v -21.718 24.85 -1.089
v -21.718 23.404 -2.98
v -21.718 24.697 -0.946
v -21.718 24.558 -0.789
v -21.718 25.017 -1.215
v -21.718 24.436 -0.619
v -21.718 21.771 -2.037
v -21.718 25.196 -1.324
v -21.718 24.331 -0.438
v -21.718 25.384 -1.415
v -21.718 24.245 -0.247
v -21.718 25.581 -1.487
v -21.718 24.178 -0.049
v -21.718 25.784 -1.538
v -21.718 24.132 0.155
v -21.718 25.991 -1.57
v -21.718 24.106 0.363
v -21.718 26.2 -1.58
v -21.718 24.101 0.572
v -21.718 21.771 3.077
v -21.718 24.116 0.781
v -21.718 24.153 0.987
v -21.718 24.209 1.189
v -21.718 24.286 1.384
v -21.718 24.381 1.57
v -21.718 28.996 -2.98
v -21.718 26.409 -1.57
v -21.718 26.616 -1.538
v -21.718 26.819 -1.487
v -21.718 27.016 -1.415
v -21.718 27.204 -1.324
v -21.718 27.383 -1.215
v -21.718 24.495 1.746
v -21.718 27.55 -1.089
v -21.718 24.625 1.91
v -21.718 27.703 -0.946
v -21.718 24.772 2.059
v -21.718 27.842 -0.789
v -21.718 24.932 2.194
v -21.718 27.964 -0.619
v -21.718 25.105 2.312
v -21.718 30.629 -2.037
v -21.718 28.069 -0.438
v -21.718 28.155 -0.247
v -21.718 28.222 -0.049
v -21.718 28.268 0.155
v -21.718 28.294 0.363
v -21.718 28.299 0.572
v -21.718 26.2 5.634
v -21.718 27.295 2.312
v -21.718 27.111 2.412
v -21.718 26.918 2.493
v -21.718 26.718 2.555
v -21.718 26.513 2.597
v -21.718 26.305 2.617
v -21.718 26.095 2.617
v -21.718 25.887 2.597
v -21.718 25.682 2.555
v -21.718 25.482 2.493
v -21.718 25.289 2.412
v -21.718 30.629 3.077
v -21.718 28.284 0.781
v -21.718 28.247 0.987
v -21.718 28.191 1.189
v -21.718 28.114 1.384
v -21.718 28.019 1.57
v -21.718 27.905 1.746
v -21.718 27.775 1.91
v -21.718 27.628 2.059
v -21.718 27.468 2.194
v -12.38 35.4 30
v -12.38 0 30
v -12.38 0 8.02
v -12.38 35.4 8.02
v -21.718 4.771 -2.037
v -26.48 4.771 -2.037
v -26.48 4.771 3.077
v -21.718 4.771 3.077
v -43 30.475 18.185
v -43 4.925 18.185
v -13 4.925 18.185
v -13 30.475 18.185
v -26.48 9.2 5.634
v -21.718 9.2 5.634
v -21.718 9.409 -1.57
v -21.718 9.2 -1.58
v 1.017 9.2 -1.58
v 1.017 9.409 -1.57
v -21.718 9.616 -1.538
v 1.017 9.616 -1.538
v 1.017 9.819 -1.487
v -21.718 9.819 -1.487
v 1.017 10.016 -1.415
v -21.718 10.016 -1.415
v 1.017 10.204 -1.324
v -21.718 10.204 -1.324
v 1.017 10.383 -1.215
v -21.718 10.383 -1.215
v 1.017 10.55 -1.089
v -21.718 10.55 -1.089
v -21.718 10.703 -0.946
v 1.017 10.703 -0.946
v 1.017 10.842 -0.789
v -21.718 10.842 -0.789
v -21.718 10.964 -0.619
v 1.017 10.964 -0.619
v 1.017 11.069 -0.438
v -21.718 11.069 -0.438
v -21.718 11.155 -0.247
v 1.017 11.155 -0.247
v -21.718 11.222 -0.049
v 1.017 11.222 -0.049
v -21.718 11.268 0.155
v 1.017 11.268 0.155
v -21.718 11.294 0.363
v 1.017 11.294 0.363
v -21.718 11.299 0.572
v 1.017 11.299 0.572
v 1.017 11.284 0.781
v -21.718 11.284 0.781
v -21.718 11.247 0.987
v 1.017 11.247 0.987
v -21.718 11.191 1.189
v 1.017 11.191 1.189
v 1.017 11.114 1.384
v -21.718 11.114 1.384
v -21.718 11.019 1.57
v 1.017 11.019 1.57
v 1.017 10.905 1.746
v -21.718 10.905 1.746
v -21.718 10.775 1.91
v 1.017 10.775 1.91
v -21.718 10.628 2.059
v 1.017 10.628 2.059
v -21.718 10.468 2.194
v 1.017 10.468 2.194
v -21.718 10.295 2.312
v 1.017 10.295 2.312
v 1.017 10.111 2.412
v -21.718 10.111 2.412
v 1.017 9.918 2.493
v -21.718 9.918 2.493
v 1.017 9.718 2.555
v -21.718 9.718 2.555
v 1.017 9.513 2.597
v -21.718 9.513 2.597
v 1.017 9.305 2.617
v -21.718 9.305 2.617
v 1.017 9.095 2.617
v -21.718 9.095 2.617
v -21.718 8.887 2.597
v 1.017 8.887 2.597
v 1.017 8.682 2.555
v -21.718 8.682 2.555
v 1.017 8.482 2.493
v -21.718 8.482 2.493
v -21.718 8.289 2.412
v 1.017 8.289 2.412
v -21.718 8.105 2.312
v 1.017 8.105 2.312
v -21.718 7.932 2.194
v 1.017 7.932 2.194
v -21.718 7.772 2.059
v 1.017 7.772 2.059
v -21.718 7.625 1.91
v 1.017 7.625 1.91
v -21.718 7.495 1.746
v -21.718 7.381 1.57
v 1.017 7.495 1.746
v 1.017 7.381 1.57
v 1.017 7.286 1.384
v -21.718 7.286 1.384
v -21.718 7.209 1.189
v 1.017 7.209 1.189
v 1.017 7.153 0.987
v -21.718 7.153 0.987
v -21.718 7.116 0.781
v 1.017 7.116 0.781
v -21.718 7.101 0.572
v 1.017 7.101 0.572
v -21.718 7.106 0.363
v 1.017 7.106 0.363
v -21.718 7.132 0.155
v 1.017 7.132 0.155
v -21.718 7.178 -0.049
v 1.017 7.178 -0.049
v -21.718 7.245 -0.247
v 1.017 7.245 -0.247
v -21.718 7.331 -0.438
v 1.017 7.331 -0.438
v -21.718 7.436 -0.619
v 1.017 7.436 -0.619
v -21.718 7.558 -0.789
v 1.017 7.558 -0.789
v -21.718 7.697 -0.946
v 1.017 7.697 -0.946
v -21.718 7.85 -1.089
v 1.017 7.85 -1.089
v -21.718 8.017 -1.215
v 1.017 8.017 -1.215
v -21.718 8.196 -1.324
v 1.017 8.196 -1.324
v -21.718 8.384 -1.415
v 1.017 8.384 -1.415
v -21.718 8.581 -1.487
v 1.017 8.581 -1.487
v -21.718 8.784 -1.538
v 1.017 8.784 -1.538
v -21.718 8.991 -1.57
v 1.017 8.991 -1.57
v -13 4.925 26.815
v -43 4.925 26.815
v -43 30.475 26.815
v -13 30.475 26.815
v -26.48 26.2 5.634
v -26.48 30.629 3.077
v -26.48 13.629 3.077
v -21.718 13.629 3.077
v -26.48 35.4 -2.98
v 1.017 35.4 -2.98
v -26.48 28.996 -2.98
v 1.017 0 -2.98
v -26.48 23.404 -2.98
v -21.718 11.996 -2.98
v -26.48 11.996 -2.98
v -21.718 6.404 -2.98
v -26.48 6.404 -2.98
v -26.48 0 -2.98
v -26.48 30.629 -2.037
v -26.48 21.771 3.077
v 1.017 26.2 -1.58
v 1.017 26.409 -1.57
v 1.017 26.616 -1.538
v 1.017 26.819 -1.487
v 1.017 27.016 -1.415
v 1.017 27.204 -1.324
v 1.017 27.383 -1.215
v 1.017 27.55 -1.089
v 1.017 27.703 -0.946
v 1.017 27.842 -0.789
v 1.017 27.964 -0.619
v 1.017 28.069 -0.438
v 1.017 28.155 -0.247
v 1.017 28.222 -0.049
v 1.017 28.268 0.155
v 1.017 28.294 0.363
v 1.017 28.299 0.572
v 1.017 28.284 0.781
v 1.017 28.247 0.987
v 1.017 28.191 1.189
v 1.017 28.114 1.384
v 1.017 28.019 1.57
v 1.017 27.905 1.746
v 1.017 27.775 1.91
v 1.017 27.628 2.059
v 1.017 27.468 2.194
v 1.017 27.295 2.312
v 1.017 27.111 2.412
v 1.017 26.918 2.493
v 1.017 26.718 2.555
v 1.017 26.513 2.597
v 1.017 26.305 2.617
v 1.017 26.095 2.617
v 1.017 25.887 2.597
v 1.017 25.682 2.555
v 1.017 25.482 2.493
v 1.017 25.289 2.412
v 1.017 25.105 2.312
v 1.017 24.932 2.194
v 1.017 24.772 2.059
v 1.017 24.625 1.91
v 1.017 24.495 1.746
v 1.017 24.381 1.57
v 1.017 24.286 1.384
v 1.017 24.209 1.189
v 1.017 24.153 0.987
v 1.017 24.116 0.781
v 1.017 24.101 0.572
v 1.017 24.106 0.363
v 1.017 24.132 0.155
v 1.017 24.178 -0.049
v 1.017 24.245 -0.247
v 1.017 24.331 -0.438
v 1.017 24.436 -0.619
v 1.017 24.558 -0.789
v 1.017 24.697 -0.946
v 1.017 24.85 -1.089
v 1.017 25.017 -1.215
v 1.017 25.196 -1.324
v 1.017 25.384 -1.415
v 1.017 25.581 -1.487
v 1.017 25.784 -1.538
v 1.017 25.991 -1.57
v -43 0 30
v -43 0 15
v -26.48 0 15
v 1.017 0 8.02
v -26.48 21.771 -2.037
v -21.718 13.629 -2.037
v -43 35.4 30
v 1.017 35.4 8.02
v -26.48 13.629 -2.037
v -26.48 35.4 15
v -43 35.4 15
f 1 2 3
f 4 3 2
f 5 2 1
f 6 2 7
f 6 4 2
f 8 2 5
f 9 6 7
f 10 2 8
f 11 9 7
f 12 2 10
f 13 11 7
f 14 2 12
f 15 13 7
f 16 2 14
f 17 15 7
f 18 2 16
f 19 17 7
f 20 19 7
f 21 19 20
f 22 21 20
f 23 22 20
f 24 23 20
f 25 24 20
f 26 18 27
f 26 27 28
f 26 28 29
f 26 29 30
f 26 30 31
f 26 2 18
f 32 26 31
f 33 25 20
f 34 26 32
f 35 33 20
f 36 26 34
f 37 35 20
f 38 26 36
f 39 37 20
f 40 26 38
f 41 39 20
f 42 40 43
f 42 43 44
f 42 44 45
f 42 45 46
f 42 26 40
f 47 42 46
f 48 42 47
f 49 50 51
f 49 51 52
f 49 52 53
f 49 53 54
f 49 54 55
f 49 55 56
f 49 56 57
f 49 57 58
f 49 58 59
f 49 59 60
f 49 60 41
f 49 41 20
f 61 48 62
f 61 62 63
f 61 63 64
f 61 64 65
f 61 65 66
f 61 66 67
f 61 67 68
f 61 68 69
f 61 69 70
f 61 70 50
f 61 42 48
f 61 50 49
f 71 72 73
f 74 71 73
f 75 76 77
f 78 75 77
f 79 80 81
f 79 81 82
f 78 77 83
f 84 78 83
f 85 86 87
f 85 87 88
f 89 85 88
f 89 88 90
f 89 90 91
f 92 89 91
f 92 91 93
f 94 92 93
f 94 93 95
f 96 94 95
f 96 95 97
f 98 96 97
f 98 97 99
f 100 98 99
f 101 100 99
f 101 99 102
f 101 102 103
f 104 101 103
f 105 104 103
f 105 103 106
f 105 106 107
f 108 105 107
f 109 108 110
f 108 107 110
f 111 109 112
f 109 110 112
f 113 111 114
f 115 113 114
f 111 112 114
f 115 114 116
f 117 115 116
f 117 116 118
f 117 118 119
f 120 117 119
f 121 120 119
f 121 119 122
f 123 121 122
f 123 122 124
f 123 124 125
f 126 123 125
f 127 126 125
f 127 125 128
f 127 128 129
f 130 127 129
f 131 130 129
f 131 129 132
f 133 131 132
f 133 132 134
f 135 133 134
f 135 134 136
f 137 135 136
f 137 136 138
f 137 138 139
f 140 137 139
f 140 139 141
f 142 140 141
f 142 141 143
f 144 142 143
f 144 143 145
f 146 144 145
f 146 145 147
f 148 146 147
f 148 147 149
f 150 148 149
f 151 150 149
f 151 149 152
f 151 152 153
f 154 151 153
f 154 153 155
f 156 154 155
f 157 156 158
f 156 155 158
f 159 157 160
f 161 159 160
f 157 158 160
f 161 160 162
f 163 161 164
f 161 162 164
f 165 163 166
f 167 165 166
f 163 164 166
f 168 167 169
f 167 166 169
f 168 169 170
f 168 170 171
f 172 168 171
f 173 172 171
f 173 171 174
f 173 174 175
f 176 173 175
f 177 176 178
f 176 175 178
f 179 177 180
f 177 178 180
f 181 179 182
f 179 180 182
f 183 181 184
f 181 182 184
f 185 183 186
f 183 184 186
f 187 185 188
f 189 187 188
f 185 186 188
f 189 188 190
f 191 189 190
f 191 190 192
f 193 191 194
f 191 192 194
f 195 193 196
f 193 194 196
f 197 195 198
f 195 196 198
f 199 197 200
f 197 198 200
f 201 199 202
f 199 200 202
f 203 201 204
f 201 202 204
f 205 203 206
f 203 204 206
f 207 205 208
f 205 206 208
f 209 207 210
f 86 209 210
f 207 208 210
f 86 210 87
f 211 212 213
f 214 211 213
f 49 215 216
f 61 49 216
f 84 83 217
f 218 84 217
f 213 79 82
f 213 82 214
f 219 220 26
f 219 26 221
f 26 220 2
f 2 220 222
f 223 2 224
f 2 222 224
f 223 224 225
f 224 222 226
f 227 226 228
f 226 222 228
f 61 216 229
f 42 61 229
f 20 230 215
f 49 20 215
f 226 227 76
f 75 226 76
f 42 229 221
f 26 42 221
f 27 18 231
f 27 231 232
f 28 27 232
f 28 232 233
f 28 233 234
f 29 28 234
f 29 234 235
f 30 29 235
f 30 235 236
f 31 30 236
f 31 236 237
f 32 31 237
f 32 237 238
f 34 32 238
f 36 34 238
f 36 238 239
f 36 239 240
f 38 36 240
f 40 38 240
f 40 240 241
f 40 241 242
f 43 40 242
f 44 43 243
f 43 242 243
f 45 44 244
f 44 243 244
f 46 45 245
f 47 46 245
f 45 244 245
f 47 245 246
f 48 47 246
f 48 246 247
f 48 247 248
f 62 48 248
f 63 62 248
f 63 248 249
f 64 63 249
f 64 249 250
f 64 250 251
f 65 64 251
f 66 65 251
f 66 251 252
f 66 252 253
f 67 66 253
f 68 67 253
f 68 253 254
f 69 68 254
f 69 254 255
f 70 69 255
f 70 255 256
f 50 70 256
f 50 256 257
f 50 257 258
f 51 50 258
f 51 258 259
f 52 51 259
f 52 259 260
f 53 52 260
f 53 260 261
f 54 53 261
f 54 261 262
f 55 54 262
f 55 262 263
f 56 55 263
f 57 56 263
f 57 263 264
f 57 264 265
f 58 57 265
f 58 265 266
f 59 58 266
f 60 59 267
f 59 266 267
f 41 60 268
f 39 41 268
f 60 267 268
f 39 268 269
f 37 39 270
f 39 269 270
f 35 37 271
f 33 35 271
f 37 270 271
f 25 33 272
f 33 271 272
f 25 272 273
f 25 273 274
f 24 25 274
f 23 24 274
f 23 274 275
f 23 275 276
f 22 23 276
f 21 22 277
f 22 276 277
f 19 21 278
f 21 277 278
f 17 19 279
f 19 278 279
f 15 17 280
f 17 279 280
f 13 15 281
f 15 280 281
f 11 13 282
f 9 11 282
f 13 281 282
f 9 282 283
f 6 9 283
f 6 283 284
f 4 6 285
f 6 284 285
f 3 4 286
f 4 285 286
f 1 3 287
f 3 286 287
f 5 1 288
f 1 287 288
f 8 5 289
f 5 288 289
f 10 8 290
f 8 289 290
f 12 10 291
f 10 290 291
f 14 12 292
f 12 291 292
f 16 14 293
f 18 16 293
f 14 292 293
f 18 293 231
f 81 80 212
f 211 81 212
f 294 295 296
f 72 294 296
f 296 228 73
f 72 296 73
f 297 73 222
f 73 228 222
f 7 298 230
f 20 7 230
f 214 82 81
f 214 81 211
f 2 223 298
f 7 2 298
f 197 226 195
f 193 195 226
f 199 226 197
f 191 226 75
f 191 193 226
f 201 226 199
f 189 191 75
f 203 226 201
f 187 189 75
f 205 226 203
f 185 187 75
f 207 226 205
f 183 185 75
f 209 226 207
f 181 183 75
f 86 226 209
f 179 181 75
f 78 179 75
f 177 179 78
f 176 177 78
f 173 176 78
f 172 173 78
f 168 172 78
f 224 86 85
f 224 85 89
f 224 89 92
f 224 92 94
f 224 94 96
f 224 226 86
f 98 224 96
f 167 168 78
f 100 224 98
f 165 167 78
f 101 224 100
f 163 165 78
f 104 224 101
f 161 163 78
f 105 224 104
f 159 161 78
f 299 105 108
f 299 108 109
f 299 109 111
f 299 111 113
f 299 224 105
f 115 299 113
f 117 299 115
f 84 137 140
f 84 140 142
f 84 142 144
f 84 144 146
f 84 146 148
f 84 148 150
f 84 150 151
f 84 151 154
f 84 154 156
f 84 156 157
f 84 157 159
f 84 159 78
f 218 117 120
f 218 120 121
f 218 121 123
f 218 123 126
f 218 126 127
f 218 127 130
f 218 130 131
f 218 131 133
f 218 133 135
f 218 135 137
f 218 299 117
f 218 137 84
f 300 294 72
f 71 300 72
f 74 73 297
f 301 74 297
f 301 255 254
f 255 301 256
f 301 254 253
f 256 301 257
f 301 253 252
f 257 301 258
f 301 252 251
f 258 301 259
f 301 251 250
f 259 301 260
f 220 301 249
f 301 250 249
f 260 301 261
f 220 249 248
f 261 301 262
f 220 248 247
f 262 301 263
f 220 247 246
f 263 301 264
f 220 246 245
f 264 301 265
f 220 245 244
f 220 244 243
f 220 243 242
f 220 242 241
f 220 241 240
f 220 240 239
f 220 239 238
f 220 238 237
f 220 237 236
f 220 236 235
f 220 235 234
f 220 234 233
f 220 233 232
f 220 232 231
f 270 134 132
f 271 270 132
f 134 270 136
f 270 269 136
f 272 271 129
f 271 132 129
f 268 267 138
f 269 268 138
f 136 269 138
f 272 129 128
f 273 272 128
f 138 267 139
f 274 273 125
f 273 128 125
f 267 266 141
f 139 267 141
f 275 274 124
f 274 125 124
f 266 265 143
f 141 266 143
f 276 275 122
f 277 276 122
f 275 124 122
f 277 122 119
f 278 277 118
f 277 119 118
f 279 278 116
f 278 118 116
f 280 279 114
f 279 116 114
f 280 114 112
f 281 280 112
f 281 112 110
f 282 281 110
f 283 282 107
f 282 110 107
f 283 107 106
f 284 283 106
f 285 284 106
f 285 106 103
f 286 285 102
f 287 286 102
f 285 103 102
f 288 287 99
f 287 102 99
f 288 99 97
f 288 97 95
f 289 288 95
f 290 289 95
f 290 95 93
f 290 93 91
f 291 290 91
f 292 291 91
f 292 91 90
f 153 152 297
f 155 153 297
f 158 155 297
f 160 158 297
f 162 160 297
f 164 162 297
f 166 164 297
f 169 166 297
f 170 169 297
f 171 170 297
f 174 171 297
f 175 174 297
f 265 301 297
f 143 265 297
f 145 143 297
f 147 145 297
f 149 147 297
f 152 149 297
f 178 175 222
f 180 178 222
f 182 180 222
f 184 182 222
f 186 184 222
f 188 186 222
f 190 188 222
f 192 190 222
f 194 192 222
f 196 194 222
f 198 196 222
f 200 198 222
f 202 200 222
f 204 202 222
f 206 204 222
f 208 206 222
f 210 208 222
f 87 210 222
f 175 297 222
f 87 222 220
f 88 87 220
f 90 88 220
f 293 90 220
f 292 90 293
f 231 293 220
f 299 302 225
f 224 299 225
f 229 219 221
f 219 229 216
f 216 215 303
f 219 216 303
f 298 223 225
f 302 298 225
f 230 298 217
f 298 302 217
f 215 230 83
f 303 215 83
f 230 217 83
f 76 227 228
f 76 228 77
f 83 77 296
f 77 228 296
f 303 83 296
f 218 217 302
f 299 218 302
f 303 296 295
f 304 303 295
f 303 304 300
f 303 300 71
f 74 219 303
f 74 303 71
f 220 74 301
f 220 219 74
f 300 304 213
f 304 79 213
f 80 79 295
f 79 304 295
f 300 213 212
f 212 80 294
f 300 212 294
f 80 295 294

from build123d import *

# Parameters (mm, degrees)
BOSS_EXTRUDE1_DEPTH = 35.4
SKETCH2_W           = 8.63
SKETCH2_H           = 25.55
CUT_EXTRUDE1_DEPTH  = 30
SKETCH3_R           = 2.1
CUT_EXTRUDE2_DEPTH  = 64.958508207
CUT_EXTRUDE3_DEPTH  = 4.7625


with BuildPart() as part:
    # Sketch1 → Boss-Extrude1 (new body)
    with BuildSketch(Plane(origin=(0, 0, 0), x_dir=(1, 0, 0), z_dir=(0, 1, 0))):
        Polygon((1.0173917, 2.98), (-26.48, 2.98), (-26.48, -15), (-31.48, -15), (-43, -15), (-43, -30), (-12.38, -30), (-12.38, -8.02), (-11.48, -8.02), (1.0173917, -8.02), align=None)
    extrude(amount=BOSS_EXTRUDE1_DEPTH)

    # Sketch2 → Cut-Extrude1 (cut)
    with BuildSketch(Plane.ZY.offset(43)):
        with Locations((22.5, 17.7)):
            Rectangle(SKETCH2_W, SKETCH2_H)
    extrude(amount=-CUT_EXTRUDE1_DEPTH, mode=Mode.SUBTRACT)

    # Sketch3 → Cut-Extrude2 (cut, through all)
    with BuildSketch(Plane(origin=(1.0173917, 0, 0), x_dir=(0, 0, -1), z_dir=(1, 0, 0))):
        with Locations((-0.52, 9.2)):
            Circle(SKETCH3_R)
        with Locations((-0.52, 26.2)):
            Circle(SKETCH3_R)
    extrude(amount=-CUT_EXTRUDE2_DEPTH, mode=Mode.SUBTRACT)

    # Sketch4 → Cut-Extrude3 (cut)
    with BuildSketch(Plane.ZY.offset(26.48)):
        Polygon((-4.594313022, 9.2), (-2.037156511, 4.770875), (3.077156511, 4.770875), (5.634313022, 9.2), (3.077156511, 13.629125), (-2.037156511, 13.629125), align=None)
        Polygon((-4.594313022, 26.2), (-2.037156511, 21.770875), (3.077156511, 21.770875), (5.634313022, 26.2), (3.077156511, 30.629125), (-2.037156511, 30.629125), align=None)
    extrude(amount=-CUT_EXTRUDE3_DEPTH, mode=Mode.SUBTRACT)


solid = part.part
